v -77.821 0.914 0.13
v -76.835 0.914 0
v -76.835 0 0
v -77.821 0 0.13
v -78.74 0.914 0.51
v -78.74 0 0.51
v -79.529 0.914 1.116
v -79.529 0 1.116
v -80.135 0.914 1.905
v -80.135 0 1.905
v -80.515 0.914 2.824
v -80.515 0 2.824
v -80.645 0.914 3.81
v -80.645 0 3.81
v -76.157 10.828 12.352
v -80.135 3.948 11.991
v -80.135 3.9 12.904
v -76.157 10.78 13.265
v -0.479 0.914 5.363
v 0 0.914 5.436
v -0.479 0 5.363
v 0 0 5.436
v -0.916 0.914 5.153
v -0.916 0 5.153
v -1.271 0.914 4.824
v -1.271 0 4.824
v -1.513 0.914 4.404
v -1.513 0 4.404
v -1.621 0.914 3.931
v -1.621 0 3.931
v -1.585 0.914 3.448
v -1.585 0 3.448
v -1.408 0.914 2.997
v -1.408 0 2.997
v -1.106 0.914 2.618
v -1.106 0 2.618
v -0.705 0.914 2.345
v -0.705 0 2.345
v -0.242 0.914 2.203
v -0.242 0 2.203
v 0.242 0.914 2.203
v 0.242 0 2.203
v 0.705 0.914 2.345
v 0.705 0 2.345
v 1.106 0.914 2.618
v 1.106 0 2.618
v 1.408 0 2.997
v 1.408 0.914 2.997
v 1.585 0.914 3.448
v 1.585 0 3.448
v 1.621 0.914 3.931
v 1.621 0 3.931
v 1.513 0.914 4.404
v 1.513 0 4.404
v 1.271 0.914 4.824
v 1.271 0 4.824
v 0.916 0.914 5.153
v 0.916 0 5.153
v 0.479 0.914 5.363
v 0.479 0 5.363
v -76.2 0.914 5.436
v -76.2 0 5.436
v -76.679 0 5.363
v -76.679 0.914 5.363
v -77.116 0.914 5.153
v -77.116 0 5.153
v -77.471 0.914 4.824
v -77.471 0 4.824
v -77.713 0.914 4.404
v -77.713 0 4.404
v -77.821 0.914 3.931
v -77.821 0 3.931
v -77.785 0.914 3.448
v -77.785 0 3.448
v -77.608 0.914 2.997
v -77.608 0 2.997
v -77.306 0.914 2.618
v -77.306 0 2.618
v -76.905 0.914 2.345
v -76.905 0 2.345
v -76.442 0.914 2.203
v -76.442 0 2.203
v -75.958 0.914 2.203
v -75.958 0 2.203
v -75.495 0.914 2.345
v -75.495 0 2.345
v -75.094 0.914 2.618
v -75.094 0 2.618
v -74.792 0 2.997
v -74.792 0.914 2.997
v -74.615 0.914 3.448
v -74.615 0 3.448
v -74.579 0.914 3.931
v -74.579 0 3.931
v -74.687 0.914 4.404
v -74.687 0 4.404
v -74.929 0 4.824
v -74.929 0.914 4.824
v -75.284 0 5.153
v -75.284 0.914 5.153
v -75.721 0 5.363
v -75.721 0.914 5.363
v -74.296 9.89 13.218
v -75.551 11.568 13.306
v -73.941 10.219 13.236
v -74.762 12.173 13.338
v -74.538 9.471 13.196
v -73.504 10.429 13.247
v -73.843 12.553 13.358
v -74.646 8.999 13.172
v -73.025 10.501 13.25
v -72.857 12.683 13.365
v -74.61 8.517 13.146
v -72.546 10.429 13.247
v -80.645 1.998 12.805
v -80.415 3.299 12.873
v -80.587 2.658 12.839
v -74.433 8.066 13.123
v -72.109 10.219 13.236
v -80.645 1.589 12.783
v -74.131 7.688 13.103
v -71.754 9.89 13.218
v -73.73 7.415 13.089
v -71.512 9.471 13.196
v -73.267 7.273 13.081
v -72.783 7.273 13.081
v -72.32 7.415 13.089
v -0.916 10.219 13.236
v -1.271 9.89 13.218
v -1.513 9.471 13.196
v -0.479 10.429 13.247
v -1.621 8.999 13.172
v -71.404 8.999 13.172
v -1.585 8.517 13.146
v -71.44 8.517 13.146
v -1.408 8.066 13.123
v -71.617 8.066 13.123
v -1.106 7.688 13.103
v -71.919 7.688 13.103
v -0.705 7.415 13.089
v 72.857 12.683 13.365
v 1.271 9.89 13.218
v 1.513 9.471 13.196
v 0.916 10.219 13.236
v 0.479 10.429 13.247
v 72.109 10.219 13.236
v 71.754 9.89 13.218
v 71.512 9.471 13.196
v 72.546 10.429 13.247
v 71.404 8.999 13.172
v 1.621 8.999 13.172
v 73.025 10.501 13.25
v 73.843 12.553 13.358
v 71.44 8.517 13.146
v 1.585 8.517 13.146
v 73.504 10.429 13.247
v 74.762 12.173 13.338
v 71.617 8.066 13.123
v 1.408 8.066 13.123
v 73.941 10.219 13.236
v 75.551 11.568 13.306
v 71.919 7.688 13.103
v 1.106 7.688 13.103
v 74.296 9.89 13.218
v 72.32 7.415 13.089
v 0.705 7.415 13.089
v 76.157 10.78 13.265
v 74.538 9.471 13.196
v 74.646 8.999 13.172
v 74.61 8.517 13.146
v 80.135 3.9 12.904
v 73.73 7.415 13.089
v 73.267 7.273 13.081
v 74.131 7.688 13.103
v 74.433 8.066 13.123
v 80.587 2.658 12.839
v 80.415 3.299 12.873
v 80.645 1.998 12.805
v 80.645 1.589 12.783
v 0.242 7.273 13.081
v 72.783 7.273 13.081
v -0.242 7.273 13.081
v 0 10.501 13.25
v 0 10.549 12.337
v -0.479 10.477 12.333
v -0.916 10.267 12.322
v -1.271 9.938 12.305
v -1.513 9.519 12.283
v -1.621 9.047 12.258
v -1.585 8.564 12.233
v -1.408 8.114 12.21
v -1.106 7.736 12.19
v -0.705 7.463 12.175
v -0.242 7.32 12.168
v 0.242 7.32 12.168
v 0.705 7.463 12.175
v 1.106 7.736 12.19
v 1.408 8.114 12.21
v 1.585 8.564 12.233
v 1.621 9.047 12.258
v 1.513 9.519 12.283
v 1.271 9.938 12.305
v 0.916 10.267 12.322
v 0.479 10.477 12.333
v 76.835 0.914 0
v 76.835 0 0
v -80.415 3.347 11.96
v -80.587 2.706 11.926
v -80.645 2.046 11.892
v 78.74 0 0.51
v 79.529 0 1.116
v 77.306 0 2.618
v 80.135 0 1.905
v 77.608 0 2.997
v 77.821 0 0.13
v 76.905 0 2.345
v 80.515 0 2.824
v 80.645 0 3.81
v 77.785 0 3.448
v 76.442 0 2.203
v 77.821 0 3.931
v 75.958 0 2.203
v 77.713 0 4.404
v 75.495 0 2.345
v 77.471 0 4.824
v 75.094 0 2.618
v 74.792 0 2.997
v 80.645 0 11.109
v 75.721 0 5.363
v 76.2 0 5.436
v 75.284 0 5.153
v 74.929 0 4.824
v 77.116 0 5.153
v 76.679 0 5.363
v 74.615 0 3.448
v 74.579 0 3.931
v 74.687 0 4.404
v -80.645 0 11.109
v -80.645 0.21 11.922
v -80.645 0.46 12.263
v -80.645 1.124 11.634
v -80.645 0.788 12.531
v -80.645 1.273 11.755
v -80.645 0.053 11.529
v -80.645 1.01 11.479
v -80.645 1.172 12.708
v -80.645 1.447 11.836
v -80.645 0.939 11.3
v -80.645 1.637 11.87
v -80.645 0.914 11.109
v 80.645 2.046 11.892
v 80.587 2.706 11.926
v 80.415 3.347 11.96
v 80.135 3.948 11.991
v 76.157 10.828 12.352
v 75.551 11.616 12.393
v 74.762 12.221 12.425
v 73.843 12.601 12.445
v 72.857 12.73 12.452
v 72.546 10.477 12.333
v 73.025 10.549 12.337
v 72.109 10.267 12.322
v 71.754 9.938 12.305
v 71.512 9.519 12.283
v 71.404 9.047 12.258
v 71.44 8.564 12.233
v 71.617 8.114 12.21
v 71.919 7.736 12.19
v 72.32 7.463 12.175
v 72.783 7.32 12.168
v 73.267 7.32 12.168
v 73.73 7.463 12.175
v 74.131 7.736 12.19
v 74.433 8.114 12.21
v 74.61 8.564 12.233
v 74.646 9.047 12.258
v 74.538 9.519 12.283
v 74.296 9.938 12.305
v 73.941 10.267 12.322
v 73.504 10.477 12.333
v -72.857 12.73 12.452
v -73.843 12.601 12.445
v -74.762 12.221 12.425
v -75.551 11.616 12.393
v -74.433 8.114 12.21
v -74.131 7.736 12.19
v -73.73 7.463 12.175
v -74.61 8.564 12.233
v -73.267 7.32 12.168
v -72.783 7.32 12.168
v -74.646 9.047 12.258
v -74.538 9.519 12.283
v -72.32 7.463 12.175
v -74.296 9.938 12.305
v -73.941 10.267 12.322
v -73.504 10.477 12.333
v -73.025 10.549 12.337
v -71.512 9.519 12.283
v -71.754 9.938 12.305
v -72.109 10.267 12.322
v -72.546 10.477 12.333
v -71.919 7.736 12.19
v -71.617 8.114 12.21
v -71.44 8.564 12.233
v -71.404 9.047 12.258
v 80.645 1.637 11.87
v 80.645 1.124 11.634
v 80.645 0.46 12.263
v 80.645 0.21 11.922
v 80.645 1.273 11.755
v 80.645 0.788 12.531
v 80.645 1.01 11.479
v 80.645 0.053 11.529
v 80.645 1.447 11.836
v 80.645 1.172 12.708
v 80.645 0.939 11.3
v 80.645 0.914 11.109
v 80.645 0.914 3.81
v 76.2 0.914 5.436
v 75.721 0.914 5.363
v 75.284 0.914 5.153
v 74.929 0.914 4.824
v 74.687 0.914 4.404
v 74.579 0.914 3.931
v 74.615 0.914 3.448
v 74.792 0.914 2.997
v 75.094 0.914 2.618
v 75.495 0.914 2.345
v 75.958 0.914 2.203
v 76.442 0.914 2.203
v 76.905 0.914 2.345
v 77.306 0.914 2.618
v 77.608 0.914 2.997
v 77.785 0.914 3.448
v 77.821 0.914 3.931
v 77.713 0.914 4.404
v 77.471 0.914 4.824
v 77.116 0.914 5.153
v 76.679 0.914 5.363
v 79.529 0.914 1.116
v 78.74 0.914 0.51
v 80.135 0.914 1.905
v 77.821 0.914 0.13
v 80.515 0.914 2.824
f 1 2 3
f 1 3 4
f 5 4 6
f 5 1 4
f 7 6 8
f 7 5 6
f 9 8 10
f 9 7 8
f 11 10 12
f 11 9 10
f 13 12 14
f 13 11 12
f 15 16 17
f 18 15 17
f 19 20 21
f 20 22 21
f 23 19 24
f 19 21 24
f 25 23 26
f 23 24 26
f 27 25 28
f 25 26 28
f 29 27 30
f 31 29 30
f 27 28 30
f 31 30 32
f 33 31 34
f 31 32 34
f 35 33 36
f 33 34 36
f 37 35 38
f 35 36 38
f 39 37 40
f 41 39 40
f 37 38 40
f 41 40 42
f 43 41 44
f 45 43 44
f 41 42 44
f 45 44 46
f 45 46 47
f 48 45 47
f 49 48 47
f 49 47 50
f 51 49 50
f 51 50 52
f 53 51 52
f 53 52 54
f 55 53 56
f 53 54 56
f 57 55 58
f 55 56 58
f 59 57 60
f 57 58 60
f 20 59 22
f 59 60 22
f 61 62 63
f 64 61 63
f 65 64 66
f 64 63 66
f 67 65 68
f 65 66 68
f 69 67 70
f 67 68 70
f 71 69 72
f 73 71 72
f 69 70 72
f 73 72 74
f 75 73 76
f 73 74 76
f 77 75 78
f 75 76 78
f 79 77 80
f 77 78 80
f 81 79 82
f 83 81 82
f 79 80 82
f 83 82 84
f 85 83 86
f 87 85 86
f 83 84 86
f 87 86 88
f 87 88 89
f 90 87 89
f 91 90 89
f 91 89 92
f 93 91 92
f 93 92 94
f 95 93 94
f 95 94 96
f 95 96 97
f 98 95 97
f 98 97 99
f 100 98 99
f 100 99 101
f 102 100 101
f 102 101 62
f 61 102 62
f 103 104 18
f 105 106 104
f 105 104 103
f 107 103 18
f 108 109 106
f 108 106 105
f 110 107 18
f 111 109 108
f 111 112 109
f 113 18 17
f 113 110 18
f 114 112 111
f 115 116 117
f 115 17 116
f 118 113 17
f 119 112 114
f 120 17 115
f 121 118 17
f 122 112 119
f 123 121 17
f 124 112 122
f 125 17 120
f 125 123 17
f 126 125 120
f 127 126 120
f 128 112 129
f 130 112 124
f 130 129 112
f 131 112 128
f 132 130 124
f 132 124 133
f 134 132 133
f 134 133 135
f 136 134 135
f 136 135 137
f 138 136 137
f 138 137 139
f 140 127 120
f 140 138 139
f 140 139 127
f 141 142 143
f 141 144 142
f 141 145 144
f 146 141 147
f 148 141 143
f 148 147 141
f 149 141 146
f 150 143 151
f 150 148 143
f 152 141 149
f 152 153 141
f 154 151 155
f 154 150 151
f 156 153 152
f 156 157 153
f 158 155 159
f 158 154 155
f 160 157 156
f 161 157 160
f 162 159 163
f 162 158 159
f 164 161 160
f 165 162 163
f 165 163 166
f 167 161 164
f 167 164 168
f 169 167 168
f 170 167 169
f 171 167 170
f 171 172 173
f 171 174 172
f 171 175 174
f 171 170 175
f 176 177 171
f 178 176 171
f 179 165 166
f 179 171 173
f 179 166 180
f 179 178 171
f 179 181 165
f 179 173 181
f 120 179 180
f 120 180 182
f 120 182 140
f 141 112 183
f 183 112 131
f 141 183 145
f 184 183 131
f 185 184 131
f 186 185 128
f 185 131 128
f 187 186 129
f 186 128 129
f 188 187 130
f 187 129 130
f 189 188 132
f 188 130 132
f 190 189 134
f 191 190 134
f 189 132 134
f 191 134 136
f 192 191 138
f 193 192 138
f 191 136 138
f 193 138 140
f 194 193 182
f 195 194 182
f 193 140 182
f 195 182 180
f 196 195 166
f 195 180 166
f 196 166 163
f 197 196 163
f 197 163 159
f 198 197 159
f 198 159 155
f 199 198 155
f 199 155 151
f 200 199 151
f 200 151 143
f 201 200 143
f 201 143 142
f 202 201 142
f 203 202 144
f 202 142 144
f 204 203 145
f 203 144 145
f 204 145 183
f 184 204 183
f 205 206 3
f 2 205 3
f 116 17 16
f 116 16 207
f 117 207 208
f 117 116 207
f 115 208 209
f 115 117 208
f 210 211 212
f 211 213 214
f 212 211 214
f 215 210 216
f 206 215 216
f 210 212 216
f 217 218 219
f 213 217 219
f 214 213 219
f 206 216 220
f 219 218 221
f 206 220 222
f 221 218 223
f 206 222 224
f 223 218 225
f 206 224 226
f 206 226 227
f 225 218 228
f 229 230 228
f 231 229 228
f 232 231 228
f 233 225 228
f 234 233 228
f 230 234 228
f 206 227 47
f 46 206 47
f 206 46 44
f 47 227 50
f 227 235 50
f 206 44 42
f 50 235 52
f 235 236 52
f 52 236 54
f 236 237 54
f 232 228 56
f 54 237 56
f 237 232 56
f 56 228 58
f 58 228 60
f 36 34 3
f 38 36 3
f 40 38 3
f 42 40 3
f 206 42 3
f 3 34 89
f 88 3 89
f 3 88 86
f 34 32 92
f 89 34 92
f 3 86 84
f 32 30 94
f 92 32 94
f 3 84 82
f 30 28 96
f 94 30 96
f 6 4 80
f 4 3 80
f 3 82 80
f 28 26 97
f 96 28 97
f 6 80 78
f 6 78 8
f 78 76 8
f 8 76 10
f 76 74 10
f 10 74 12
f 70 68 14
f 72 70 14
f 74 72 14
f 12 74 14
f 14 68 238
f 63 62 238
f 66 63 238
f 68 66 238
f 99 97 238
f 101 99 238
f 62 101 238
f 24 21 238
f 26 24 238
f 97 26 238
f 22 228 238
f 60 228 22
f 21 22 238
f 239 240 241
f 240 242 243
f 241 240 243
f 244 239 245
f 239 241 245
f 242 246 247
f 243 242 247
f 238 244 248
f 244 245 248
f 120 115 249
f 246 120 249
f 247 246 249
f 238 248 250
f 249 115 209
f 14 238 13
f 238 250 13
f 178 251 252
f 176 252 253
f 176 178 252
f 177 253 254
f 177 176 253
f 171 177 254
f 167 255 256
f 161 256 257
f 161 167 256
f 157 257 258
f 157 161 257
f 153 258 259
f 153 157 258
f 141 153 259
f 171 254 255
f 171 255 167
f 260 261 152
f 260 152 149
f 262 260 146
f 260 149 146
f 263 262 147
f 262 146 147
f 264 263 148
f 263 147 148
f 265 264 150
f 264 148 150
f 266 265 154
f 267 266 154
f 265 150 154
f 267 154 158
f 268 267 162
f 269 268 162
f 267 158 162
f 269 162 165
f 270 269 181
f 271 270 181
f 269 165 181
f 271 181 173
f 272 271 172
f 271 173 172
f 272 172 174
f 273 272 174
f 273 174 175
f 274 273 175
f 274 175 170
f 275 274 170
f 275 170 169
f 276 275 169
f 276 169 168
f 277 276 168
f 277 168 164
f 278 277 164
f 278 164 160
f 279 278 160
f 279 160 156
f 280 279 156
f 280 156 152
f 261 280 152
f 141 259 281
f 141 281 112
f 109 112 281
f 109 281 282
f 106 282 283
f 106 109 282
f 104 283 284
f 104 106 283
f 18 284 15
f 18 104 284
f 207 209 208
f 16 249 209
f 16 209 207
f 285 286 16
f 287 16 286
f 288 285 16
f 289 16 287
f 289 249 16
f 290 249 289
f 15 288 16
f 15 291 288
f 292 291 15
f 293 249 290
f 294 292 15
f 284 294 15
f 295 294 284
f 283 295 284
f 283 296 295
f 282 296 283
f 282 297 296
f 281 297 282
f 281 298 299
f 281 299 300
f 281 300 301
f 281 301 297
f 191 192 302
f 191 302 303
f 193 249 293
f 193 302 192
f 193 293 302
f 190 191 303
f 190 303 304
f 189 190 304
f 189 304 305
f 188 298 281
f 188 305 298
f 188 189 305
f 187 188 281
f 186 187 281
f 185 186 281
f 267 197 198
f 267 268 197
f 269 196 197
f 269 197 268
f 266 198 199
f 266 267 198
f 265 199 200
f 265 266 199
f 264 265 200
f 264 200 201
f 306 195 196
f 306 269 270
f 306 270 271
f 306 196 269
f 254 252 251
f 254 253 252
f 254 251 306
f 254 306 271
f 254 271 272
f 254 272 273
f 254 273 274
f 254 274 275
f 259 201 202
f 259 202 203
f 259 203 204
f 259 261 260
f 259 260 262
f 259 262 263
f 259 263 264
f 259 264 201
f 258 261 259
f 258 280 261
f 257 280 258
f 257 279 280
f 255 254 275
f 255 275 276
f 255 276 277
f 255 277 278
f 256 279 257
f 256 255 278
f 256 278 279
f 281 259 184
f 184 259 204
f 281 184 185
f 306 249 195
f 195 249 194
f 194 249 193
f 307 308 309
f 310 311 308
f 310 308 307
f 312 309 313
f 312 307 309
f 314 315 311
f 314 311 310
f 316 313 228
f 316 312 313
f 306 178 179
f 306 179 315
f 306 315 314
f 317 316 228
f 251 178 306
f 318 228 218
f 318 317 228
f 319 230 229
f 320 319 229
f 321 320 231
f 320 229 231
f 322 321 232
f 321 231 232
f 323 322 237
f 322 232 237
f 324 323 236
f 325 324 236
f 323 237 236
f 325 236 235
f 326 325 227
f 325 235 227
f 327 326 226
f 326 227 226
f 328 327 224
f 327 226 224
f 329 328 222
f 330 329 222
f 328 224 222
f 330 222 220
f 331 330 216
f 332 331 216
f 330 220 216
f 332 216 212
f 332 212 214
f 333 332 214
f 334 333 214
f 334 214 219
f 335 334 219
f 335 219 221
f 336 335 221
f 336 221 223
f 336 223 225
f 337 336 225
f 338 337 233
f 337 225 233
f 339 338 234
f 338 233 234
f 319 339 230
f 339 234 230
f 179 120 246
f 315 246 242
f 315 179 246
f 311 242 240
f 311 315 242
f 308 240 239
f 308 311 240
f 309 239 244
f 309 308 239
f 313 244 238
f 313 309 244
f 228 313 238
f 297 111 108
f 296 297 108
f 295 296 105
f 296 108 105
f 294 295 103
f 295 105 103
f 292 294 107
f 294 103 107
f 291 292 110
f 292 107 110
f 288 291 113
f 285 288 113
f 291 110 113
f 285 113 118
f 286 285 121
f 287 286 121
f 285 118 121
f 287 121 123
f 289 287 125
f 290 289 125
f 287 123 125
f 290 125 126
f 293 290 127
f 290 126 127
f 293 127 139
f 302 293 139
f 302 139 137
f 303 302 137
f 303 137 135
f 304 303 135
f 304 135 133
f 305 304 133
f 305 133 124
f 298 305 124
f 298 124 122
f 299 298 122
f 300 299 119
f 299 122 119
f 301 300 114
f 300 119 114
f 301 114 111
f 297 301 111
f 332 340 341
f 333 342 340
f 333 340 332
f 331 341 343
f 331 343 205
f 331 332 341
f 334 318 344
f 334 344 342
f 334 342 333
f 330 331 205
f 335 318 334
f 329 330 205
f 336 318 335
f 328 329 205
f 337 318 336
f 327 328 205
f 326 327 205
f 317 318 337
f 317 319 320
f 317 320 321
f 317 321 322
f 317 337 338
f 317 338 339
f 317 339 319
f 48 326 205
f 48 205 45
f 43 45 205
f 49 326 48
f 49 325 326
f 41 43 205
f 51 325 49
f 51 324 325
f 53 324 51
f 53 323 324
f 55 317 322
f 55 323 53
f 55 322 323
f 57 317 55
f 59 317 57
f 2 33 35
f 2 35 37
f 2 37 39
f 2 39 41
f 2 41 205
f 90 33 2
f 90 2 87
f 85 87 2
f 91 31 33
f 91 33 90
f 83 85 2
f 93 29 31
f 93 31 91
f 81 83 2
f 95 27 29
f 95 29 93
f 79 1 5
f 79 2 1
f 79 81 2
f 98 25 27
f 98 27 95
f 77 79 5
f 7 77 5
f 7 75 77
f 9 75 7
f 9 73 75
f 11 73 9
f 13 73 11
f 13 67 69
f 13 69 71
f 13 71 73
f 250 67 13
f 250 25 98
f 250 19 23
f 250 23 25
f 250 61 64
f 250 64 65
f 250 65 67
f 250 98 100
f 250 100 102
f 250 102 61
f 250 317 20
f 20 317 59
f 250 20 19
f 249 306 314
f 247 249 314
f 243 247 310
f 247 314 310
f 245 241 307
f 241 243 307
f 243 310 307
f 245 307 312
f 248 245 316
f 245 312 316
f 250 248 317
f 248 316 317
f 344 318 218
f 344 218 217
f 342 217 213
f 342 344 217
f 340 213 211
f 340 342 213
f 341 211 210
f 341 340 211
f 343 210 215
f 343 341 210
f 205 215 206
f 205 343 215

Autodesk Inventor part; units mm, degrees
ref_plane "YZ Plane" through (0, 0, 0) normal (1, 0, 0) x (0, 1, 0)
ref_plane "XZ Plane" through (0, 0, 0) normal (0, 1, 0) x (-1, 0, 0)
ref_plane "XY Plane" through (0, 0, 0) normal (0, 0, 1) x (1, 0, 0)
sketch "Sketch1" plane through (0, 0, 0) normal (0, 1, 0) x (-1, 0, 0)
  line L0 (-80.645, 0) -> (80.645, 0)
  line L1 (80.645, 0) -> (80.645, 12.7)
  line L2 (80.645, 12.7) -> (-80.645, 12.7)
  line L3 (-80.645, 12.7) -> (-80.645, 0)
  line L4 (-80.645, 0) -> (80.645, 12.7) construction
  line L5 (80.645, 0) -> (-80.645, 12.7) construction
  point P0 (0, 0)
  point P1 (0, 6.35)
  point P2 (0, 0)
  dimension "d0" = 12.7
  dimension "d1" = 161.29
extrude "Plate1" add sketch "Sketch1" along normal blind 0.9144
sketch "Sketch2" plane through (80.645, 0.0479, 11.7869) normal (0, -0.052336, 0.9986295) x (1, 0, 0)
  line L0 (-161.29, 0) -> (0, 0)
  line L1 (0, 0) -> (0, 12.7)
  line L2 (0, 12.7) -> (-161.29, 12.7)
  line L3 (-161.29, 12.7) -> (-161.29, 0)
edge flange "Flange1" height 12.7 angle 87 thickness 0.9144 bend radius 0.762 thickness toward (0, -0.052336, 0.9986295) relief tear relief width 0.9144 relief depth 0.4572 edges at (0, 0.9144, 12.7) wall of the first edge with corners at (-80.645, 0.0479, 11.7869) (80.645, 0.0479, 11.7869) (80.645, 12.7305, 12.4515) (-80.645, 12.7305, 12.4515)
bend "Bend1"
corner "Corner1"
sketch "Sketch3" plane through (0, 0.9144, 0) normal (0, 1, 0) x (1, 0, 0)
  line L0 (76.2, -3.81) -> (-76.2, -3.81) construction
  line L1 (-80.645, 0) -> (80.645, 0) construction
  point P0 (0, 0)
  point P1 (0, -3.81)
  point P2 (0, -3.81)
  point P3 (0, 0)
  dimension "d13" = 152.4
  dimension "d14" = 3.81
hole "Hole1" at (76.2, 0.9144, 3.81) at (0, 0.9144, 3.81) at (-76.2, 0.9144, 3.81) direction (0, -1, 0) diameter 3.2512 end through all
sketch "Sketch4" plane through (80.645, 12.7305, 12.4515) normal (0, 0.052336, -0.9986295) x (-1, 0, 0)
  line L0 (7.62, -3.81) -> (153.67, -3.81) construction
  line L1 (161.29, 0) -> (0, 0) construction
  point P0 (80.645, -13.3647)
  point P1 (80.645, -3.81)
  point P2 (80.645, -3.81)
  dimension "d22" = 146.05
  dimension "d23" = 3.81
hole "Hole2" at (73.025, 8.9257, 12.2521) at (0, 8.9257, 12.2521) at (-73.025, 8.9257, 12.2521) direction (0, -0.052336, 0.9986295) diameter 3.2512 end through all
chamfer "Corner Chamfer1" distance 5.588 angle 60 2 edges at (-80.645, 12.7065, 12.9081) (80.645, 12.7065, 12.9081) measured on face at (-26.8817, 12.6985, 13.0603)
fillet "Corner Round1" radius 3.81 6 edges at (80.645, 0.4572, 0) (-80.645, 0.4572, 0) (-75.057, 12.7065, 12.9081) (75.057, 12.7065, 12.9081) (-80.645, 3.0411, 12.4015) (80.645, 3.0411, 12.4015)
equation "\"d20\" = Thickness"
equation "\"d29\" = Thickness"
equation "\"d2\" = Thickness"
equation "\"d3\" = BendReliefWidth"
equation "\"d4\" = BendReliefDepth"
equation "\"d5\" = MinimumRemnant"
equation "\"d6\" = TransitionRadius"
equation "\"d9\" = BendRadius"
equation "\"d10\" = CornerReliefSize"
equation "\"d11\" = GapSize"
equation "\"d12\" = JacobiRadiusSize"
equation "\"BendReliefWidth\" = Thickness"
equation "\"BendReliefDepth\" = 0.5 * Thickness"
equation "\"CornerReliefSize\" = 4 * Thickness"
equation "\"MinimumRemnant\" = 2 * Thickness"
equation "\"TransitionRadius\" = BendRadius"
equation "\"JacobiRadiusSize\" = BendRadius"
equation "\"GapSize\" = Thickness"
equation "\"Thickness\" = 0.9144"
equation "\"BendRadius\" = 0.762"
properties part number "J009835" material "STAINLESS STEEL, 316"
